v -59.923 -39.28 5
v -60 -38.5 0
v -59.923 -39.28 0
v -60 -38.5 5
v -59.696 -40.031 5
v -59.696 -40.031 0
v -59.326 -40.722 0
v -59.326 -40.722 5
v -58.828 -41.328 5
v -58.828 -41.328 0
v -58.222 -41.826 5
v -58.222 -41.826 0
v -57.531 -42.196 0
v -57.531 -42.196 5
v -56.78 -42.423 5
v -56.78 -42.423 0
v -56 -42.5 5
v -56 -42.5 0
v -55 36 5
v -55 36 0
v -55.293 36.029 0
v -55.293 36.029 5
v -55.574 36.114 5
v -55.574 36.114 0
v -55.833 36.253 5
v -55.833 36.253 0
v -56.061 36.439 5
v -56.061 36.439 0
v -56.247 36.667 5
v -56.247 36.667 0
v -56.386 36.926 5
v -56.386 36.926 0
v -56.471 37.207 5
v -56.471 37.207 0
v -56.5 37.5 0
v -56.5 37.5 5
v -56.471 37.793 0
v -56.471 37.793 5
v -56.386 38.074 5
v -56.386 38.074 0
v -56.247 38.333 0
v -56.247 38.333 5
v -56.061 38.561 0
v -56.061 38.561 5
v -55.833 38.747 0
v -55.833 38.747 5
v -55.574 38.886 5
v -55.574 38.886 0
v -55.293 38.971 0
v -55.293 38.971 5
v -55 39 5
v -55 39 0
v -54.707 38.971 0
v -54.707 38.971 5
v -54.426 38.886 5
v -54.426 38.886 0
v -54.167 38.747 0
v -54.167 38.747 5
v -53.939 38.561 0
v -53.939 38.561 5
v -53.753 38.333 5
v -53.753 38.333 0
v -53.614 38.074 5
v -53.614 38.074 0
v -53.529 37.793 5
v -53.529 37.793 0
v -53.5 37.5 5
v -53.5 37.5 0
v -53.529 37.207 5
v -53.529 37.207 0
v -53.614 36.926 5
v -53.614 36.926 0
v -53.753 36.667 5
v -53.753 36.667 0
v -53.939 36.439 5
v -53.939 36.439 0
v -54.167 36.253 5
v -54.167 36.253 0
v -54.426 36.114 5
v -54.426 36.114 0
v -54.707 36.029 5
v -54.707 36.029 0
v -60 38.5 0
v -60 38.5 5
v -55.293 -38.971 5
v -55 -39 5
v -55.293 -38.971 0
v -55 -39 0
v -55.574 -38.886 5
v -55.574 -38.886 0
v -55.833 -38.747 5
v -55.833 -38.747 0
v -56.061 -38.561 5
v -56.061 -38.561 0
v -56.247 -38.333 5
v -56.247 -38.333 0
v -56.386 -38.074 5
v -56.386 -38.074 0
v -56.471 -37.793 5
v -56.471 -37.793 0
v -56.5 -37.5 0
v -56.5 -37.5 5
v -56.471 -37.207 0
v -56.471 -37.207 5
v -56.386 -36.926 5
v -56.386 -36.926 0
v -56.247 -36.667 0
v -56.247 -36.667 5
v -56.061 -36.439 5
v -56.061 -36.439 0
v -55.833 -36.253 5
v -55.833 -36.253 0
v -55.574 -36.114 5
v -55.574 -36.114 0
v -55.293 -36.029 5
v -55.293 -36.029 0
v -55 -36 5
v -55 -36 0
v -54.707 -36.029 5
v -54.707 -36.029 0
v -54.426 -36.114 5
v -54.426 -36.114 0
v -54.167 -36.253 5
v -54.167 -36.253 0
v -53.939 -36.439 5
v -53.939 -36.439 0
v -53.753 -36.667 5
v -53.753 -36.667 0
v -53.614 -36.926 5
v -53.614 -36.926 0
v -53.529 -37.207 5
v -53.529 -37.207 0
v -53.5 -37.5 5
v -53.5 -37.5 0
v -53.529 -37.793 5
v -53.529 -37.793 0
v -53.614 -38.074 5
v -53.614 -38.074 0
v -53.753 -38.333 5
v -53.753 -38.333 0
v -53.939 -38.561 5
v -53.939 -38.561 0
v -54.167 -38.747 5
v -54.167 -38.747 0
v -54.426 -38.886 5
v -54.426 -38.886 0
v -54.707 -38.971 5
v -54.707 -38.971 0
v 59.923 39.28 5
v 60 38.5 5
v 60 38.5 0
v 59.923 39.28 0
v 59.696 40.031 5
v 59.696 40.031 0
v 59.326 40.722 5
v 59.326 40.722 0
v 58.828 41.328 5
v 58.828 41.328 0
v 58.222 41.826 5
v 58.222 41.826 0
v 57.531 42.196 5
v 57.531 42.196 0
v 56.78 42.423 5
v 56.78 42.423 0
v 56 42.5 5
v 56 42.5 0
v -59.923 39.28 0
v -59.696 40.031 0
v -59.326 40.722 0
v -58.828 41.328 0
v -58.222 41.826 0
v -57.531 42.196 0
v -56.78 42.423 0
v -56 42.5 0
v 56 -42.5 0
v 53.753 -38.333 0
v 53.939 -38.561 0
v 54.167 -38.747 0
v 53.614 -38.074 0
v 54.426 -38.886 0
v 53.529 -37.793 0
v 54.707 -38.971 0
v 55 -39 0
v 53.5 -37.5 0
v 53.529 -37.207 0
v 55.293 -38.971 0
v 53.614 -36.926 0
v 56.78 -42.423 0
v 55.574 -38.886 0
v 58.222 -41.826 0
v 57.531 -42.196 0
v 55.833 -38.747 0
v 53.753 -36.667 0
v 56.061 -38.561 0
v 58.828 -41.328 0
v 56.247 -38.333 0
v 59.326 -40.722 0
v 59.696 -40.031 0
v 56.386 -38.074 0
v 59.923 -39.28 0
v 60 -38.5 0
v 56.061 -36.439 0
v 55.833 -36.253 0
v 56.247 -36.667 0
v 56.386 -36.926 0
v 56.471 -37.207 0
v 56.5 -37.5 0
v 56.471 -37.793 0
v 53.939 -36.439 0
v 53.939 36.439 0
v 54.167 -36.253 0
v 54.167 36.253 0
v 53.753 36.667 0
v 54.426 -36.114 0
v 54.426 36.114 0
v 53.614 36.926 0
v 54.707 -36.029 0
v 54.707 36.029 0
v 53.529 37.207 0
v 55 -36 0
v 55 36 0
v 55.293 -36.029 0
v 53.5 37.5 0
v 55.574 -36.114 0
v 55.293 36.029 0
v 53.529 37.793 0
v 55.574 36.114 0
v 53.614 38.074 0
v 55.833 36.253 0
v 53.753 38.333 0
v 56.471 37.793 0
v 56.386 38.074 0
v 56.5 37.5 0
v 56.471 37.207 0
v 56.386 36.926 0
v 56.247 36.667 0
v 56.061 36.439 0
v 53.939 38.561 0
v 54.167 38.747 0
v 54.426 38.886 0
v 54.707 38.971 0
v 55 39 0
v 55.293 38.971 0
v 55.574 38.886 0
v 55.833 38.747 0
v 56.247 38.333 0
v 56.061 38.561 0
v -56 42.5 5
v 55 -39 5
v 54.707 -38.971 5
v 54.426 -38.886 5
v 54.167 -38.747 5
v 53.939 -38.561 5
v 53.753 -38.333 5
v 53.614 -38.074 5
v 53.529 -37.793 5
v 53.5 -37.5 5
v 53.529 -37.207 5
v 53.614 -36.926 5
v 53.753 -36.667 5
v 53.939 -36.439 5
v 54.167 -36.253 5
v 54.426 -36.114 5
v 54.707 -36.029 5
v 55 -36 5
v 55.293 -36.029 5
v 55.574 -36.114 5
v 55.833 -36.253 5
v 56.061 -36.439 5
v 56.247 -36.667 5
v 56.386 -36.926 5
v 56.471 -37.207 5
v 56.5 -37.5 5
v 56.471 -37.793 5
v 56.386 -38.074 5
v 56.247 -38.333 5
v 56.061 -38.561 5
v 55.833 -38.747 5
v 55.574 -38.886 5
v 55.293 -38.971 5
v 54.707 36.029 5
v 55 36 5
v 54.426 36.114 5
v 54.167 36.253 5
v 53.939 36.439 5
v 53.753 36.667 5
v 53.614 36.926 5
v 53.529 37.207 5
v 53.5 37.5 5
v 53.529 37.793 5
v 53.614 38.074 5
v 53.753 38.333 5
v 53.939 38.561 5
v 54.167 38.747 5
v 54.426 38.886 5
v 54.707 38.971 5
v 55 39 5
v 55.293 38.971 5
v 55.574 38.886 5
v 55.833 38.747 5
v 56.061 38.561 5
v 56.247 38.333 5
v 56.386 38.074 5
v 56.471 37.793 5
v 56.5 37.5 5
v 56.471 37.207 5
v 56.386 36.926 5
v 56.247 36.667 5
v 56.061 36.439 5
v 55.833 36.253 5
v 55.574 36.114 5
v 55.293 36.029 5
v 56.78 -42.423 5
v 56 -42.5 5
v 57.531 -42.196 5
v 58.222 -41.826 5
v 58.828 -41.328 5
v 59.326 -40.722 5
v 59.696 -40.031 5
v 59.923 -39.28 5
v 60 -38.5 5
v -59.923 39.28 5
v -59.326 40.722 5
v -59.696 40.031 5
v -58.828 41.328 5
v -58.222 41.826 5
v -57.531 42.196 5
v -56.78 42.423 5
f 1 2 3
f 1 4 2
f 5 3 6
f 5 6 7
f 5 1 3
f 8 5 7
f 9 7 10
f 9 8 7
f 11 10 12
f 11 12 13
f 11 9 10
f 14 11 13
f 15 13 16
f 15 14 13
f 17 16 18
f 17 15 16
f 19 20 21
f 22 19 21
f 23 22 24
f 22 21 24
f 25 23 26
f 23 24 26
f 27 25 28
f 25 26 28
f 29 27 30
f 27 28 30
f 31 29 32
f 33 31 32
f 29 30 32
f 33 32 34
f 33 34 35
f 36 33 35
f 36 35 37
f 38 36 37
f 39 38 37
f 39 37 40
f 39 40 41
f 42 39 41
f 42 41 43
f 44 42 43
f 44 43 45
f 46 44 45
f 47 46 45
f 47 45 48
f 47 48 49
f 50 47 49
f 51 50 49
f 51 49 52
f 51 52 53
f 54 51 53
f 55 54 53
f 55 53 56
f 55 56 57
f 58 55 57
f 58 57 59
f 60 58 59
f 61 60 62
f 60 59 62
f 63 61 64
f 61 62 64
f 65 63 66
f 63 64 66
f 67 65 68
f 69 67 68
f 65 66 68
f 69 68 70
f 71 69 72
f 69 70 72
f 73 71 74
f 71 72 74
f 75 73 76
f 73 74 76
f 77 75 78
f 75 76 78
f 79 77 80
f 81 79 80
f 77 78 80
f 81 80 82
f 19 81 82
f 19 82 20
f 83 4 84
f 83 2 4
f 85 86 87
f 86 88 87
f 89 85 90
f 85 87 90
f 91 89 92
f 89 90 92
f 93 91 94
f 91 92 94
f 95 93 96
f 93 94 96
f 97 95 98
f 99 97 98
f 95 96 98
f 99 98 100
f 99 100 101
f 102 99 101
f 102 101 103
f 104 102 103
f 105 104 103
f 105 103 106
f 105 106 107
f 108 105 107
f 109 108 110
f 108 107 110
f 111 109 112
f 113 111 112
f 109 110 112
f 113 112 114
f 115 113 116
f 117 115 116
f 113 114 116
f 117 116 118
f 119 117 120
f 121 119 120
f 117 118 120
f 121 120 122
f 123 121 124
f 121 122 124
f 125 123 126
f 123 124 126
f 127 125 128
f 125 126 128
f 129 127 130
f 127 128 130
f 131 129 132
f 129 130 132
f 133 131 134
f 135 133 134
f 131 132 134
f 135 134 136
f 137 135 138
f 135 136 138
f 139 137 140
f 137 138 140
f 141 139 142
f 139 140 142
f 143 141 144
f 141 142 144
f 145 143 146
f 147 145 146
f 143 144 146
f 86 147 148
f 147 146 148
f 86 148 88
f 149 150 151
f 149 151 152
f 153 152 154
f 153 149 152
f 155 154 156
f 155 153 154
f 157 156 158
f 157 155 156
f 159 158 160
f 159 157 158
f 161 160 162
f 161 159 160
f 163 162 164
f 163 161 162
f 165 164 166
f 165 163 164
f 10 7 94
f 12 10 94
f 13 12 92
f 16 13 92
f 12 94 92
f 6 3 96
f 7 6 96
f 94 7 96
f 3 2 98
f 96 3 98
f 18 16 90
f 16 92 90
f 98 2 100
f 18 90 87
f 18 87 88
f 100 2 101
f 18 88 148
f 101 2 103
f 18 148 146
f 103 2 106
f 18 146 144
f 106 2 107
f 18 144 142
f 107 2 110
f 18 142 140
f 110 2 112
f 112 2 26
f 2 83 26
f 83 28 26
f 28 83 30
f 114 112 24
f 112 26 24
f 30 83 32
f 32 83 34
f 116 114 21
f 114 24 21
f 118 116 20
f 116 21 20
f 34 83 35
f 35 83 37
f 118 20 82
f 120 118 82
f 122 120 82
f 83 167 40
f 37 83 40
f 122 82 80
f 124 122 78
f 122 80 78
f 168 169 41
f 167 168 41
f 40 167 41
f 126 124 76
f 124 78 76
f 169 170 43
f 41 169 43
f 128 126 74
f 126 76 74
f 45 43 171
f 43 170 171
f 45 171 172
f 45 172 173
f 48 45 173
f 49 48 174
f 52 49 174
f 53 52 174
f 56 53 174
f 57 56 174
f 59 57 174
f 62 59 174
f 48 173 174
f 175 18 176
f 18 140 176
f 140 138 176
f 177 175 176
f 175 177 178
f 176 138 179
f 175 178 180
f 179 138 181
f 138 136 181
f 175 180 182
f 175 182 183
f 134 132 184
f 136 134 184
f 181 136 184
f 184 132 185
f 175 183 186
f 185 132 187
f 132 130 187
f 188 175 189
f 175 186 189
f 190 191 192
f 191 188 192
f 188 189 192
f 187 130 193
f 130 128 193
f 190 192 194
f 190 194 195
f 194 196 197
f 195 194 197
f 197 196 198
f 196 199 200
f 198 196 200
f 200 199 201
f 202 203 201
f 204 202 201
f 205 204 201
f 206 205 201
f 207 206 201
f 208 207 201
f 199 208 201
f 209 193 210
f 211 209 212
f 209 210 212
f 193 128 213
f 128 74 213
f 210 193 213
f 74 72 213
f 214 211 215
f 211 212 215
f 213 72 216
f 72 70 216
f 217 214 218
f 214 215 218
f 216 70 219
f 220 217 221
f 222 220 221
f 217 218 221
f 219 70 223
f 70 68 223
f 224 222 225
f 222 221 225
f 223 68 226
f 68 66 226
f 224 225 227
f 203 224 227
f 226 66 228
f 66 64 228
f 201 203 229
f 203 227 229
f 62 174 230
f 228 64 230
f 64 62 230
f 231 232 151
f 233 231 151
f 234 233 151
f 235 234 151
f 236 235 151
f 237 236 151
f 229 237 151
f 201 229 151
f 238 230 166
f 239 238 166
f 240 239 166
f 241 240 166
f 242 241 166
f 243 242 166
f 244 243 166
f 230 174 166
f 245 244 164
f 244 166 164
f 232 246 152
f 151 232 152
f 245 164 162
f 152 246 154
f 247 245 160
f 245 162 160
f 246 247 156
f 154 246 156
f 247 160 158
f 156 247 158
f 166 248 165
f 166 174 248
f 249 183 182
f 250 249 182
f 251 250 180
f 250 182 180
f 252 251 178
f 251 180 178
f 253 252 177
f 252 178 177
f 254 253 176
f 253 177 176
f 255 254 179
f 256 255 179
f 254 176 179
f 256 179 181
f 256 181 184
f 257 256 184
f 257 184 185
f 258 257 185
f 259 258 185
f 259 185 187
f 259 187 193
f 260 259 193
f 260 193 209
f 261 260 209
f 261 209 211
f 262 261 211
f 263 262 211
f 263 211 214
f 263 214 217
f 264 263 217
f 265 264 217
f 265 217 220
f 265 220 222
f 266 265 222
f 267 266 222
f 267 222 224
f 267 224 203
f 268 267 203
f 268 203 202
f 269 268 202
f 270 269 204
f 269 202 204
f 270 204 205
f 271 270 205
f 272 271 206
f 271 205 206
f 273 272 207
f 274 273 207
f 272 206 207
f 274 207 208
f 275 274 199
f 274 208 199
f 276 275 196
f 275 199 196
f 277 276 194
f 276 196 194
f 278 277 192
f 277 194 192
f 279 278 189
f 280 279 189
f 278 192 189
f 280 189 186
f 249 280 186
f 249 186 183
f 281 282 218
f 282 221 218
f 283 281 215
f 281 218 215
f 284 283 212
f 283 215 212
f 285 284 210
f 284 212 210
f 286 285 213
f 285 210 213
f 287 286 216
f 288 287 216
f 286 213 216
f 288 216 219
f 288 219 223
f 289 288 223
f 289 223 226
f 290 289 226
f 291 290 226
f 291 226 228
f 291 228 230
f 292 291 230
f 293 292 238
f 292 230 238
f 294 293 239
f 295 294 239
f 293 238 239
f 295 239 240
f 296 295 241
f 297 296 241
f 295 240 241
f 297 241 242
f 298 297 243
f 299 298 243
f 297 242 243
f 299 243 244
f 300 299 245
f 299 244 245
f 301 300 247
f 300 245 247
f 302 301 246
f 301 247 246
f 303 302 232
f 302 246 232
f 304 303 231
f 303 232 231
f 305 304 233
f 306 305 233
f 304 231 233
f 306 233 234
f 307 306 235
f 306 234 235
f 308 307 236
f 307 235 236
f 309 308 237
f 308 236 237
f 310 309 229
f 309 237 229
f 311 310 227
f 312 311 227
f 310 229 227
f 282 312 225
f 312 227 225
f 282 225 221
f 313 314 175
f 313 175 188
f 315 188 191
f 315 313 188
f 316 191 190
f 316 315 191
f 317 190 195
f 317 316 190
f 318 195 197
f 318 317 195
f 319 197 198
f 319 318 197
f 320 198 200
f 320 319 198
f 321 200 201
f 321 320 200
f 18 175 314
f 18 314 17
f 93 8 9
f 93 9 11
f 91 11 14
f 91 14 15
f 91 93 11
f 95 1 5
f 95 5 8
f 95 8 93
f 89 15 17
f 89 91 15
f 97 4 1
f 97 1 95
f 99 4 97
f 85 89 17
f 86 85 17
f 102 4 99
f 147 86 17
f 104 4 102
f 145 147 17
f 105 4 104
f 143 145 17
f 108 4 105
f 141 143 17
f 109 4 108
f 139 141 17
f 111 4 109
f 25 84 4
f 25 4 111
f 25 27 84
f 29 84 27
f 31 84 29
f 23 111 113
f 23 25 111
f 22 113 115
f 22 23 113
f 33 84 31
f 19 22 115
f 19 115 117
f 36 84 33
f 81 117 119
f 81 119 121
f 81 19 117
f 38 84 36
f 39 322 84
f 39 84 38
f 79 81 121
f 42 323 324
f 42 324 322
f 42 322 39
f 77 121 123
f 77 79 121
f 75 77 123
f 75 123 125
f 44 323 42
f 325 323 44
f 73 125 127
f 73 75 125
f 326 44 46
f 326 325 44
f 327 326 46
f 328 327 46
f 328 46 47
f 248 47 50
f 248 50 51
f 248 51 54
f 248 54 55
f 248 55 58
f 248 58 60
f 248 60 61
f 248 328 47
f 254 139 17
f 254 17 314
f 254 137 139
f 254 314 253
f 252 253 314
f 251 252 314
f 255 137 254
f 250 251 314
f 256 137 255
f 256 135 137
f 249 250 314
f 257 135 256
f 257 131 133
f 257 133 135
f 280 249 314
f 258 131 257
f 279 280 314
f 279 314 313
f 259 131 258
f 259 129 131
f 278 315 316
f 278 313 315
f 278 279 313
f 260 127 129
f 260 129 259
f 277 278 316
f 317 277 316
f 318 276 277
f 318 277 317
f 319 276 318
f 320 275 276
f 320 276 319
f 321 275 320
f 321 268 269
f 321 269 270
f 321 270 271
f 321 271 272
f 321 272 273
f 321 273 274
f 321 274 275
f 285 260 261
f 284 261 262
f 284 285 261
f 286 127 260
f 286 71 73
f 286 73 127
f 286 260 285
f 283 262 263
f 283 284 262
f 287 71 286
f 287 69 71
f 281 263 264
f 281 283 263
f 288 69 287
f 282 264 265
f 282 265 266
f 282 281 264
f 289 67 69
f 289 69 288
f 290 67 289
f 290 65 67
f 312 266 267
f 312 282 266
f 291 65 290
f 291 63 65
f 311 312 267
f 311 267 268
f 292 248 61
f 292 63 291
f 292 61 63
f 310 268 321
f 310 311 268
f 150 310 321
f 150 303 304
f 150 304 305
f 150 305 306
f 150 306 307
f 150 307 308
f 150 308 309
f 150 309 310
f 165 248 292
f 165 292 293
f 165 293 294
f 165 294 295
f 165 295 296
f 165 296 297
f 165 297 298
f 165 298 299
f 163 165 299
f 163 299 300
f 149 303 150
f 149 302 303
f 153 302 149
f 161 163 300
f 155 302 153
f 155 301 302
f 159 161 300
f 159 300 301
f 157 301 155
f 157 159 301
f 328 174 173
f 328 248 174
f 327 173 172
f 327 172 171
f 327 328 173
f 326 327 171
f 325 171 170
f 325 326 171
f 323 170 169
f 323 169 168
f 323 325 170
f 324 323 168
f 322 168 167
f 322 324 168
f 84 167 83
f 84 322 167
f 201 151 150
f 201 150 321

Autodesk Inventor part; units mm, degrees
ref_plane "YZ Plane" through (0, 0, 0) normal (1, 0, 0) x (0, 1, 0)
ref_plane "XZ Plane" through (0, 0, 0) normal (0, 1, 0) x (-1, 0, 0)
ref_plane "XY Plane" through (0, 0, 0) normal (0, 0, 1) x (1, 0, 0)
sketch "Sketch1" plane through (0, 0, 0) normal (0, 0, 1) x (1, 0, 0)
  line L0 (-60, 42.5) -> (60, 42.5)
  line L1 (60, 42.5) -> (60, -42.5)
  line L2 (60, -42.5) -> (-60, -42.5)
  line L3 (-60, -42.5) -> (-60, 42.5)
  point P0 (0, 0)
  point P1 (0, 42.5)
  point P2 (60, 0)
  dimension "d0" = 120
  dimension "d1" = 85
extrude "Extrusion1" add sketch "Sketch1" along normal blind 5
sketch "Sketch2" plane through (0, 0, 5) normal (0, 0, 1) x (1, 0, 0)
  line L0 (-55, 37.5) -> (55, 37.5) construction
  line L1 (55, 37.5) -> (55, -37.5) construction
  line L2 (55, -37.5) -> (-55, -37.5) construction
  line L3 (-55, -37.5) -> (-55, 37.5) construction
  point P0 (0, 0)
  point P1 (0, 37.5)
  point P2 (55, 0)
  point P3 (-21.4621, 82.9295)
  dimension "d4" = 110
  dimension "d5" = 75
hole "Hole1" at (-55, 37.5, 5) at (55, 37.5, 5) at (55, -37.5, 5) at (-55, -37.5, 5) at (-21.4621, 82.9295, 5) direction (0, 0, -1) diameter 3 end through all
fillet "Fillet1" radius 4 4 edges at (60, 42.5, 2.5) (60, -42.5, 2.5) (-60, 42.5, 2.5) (-60, -42.5, 2.5)
properties part number "duo-esp32-pcb-outline"
